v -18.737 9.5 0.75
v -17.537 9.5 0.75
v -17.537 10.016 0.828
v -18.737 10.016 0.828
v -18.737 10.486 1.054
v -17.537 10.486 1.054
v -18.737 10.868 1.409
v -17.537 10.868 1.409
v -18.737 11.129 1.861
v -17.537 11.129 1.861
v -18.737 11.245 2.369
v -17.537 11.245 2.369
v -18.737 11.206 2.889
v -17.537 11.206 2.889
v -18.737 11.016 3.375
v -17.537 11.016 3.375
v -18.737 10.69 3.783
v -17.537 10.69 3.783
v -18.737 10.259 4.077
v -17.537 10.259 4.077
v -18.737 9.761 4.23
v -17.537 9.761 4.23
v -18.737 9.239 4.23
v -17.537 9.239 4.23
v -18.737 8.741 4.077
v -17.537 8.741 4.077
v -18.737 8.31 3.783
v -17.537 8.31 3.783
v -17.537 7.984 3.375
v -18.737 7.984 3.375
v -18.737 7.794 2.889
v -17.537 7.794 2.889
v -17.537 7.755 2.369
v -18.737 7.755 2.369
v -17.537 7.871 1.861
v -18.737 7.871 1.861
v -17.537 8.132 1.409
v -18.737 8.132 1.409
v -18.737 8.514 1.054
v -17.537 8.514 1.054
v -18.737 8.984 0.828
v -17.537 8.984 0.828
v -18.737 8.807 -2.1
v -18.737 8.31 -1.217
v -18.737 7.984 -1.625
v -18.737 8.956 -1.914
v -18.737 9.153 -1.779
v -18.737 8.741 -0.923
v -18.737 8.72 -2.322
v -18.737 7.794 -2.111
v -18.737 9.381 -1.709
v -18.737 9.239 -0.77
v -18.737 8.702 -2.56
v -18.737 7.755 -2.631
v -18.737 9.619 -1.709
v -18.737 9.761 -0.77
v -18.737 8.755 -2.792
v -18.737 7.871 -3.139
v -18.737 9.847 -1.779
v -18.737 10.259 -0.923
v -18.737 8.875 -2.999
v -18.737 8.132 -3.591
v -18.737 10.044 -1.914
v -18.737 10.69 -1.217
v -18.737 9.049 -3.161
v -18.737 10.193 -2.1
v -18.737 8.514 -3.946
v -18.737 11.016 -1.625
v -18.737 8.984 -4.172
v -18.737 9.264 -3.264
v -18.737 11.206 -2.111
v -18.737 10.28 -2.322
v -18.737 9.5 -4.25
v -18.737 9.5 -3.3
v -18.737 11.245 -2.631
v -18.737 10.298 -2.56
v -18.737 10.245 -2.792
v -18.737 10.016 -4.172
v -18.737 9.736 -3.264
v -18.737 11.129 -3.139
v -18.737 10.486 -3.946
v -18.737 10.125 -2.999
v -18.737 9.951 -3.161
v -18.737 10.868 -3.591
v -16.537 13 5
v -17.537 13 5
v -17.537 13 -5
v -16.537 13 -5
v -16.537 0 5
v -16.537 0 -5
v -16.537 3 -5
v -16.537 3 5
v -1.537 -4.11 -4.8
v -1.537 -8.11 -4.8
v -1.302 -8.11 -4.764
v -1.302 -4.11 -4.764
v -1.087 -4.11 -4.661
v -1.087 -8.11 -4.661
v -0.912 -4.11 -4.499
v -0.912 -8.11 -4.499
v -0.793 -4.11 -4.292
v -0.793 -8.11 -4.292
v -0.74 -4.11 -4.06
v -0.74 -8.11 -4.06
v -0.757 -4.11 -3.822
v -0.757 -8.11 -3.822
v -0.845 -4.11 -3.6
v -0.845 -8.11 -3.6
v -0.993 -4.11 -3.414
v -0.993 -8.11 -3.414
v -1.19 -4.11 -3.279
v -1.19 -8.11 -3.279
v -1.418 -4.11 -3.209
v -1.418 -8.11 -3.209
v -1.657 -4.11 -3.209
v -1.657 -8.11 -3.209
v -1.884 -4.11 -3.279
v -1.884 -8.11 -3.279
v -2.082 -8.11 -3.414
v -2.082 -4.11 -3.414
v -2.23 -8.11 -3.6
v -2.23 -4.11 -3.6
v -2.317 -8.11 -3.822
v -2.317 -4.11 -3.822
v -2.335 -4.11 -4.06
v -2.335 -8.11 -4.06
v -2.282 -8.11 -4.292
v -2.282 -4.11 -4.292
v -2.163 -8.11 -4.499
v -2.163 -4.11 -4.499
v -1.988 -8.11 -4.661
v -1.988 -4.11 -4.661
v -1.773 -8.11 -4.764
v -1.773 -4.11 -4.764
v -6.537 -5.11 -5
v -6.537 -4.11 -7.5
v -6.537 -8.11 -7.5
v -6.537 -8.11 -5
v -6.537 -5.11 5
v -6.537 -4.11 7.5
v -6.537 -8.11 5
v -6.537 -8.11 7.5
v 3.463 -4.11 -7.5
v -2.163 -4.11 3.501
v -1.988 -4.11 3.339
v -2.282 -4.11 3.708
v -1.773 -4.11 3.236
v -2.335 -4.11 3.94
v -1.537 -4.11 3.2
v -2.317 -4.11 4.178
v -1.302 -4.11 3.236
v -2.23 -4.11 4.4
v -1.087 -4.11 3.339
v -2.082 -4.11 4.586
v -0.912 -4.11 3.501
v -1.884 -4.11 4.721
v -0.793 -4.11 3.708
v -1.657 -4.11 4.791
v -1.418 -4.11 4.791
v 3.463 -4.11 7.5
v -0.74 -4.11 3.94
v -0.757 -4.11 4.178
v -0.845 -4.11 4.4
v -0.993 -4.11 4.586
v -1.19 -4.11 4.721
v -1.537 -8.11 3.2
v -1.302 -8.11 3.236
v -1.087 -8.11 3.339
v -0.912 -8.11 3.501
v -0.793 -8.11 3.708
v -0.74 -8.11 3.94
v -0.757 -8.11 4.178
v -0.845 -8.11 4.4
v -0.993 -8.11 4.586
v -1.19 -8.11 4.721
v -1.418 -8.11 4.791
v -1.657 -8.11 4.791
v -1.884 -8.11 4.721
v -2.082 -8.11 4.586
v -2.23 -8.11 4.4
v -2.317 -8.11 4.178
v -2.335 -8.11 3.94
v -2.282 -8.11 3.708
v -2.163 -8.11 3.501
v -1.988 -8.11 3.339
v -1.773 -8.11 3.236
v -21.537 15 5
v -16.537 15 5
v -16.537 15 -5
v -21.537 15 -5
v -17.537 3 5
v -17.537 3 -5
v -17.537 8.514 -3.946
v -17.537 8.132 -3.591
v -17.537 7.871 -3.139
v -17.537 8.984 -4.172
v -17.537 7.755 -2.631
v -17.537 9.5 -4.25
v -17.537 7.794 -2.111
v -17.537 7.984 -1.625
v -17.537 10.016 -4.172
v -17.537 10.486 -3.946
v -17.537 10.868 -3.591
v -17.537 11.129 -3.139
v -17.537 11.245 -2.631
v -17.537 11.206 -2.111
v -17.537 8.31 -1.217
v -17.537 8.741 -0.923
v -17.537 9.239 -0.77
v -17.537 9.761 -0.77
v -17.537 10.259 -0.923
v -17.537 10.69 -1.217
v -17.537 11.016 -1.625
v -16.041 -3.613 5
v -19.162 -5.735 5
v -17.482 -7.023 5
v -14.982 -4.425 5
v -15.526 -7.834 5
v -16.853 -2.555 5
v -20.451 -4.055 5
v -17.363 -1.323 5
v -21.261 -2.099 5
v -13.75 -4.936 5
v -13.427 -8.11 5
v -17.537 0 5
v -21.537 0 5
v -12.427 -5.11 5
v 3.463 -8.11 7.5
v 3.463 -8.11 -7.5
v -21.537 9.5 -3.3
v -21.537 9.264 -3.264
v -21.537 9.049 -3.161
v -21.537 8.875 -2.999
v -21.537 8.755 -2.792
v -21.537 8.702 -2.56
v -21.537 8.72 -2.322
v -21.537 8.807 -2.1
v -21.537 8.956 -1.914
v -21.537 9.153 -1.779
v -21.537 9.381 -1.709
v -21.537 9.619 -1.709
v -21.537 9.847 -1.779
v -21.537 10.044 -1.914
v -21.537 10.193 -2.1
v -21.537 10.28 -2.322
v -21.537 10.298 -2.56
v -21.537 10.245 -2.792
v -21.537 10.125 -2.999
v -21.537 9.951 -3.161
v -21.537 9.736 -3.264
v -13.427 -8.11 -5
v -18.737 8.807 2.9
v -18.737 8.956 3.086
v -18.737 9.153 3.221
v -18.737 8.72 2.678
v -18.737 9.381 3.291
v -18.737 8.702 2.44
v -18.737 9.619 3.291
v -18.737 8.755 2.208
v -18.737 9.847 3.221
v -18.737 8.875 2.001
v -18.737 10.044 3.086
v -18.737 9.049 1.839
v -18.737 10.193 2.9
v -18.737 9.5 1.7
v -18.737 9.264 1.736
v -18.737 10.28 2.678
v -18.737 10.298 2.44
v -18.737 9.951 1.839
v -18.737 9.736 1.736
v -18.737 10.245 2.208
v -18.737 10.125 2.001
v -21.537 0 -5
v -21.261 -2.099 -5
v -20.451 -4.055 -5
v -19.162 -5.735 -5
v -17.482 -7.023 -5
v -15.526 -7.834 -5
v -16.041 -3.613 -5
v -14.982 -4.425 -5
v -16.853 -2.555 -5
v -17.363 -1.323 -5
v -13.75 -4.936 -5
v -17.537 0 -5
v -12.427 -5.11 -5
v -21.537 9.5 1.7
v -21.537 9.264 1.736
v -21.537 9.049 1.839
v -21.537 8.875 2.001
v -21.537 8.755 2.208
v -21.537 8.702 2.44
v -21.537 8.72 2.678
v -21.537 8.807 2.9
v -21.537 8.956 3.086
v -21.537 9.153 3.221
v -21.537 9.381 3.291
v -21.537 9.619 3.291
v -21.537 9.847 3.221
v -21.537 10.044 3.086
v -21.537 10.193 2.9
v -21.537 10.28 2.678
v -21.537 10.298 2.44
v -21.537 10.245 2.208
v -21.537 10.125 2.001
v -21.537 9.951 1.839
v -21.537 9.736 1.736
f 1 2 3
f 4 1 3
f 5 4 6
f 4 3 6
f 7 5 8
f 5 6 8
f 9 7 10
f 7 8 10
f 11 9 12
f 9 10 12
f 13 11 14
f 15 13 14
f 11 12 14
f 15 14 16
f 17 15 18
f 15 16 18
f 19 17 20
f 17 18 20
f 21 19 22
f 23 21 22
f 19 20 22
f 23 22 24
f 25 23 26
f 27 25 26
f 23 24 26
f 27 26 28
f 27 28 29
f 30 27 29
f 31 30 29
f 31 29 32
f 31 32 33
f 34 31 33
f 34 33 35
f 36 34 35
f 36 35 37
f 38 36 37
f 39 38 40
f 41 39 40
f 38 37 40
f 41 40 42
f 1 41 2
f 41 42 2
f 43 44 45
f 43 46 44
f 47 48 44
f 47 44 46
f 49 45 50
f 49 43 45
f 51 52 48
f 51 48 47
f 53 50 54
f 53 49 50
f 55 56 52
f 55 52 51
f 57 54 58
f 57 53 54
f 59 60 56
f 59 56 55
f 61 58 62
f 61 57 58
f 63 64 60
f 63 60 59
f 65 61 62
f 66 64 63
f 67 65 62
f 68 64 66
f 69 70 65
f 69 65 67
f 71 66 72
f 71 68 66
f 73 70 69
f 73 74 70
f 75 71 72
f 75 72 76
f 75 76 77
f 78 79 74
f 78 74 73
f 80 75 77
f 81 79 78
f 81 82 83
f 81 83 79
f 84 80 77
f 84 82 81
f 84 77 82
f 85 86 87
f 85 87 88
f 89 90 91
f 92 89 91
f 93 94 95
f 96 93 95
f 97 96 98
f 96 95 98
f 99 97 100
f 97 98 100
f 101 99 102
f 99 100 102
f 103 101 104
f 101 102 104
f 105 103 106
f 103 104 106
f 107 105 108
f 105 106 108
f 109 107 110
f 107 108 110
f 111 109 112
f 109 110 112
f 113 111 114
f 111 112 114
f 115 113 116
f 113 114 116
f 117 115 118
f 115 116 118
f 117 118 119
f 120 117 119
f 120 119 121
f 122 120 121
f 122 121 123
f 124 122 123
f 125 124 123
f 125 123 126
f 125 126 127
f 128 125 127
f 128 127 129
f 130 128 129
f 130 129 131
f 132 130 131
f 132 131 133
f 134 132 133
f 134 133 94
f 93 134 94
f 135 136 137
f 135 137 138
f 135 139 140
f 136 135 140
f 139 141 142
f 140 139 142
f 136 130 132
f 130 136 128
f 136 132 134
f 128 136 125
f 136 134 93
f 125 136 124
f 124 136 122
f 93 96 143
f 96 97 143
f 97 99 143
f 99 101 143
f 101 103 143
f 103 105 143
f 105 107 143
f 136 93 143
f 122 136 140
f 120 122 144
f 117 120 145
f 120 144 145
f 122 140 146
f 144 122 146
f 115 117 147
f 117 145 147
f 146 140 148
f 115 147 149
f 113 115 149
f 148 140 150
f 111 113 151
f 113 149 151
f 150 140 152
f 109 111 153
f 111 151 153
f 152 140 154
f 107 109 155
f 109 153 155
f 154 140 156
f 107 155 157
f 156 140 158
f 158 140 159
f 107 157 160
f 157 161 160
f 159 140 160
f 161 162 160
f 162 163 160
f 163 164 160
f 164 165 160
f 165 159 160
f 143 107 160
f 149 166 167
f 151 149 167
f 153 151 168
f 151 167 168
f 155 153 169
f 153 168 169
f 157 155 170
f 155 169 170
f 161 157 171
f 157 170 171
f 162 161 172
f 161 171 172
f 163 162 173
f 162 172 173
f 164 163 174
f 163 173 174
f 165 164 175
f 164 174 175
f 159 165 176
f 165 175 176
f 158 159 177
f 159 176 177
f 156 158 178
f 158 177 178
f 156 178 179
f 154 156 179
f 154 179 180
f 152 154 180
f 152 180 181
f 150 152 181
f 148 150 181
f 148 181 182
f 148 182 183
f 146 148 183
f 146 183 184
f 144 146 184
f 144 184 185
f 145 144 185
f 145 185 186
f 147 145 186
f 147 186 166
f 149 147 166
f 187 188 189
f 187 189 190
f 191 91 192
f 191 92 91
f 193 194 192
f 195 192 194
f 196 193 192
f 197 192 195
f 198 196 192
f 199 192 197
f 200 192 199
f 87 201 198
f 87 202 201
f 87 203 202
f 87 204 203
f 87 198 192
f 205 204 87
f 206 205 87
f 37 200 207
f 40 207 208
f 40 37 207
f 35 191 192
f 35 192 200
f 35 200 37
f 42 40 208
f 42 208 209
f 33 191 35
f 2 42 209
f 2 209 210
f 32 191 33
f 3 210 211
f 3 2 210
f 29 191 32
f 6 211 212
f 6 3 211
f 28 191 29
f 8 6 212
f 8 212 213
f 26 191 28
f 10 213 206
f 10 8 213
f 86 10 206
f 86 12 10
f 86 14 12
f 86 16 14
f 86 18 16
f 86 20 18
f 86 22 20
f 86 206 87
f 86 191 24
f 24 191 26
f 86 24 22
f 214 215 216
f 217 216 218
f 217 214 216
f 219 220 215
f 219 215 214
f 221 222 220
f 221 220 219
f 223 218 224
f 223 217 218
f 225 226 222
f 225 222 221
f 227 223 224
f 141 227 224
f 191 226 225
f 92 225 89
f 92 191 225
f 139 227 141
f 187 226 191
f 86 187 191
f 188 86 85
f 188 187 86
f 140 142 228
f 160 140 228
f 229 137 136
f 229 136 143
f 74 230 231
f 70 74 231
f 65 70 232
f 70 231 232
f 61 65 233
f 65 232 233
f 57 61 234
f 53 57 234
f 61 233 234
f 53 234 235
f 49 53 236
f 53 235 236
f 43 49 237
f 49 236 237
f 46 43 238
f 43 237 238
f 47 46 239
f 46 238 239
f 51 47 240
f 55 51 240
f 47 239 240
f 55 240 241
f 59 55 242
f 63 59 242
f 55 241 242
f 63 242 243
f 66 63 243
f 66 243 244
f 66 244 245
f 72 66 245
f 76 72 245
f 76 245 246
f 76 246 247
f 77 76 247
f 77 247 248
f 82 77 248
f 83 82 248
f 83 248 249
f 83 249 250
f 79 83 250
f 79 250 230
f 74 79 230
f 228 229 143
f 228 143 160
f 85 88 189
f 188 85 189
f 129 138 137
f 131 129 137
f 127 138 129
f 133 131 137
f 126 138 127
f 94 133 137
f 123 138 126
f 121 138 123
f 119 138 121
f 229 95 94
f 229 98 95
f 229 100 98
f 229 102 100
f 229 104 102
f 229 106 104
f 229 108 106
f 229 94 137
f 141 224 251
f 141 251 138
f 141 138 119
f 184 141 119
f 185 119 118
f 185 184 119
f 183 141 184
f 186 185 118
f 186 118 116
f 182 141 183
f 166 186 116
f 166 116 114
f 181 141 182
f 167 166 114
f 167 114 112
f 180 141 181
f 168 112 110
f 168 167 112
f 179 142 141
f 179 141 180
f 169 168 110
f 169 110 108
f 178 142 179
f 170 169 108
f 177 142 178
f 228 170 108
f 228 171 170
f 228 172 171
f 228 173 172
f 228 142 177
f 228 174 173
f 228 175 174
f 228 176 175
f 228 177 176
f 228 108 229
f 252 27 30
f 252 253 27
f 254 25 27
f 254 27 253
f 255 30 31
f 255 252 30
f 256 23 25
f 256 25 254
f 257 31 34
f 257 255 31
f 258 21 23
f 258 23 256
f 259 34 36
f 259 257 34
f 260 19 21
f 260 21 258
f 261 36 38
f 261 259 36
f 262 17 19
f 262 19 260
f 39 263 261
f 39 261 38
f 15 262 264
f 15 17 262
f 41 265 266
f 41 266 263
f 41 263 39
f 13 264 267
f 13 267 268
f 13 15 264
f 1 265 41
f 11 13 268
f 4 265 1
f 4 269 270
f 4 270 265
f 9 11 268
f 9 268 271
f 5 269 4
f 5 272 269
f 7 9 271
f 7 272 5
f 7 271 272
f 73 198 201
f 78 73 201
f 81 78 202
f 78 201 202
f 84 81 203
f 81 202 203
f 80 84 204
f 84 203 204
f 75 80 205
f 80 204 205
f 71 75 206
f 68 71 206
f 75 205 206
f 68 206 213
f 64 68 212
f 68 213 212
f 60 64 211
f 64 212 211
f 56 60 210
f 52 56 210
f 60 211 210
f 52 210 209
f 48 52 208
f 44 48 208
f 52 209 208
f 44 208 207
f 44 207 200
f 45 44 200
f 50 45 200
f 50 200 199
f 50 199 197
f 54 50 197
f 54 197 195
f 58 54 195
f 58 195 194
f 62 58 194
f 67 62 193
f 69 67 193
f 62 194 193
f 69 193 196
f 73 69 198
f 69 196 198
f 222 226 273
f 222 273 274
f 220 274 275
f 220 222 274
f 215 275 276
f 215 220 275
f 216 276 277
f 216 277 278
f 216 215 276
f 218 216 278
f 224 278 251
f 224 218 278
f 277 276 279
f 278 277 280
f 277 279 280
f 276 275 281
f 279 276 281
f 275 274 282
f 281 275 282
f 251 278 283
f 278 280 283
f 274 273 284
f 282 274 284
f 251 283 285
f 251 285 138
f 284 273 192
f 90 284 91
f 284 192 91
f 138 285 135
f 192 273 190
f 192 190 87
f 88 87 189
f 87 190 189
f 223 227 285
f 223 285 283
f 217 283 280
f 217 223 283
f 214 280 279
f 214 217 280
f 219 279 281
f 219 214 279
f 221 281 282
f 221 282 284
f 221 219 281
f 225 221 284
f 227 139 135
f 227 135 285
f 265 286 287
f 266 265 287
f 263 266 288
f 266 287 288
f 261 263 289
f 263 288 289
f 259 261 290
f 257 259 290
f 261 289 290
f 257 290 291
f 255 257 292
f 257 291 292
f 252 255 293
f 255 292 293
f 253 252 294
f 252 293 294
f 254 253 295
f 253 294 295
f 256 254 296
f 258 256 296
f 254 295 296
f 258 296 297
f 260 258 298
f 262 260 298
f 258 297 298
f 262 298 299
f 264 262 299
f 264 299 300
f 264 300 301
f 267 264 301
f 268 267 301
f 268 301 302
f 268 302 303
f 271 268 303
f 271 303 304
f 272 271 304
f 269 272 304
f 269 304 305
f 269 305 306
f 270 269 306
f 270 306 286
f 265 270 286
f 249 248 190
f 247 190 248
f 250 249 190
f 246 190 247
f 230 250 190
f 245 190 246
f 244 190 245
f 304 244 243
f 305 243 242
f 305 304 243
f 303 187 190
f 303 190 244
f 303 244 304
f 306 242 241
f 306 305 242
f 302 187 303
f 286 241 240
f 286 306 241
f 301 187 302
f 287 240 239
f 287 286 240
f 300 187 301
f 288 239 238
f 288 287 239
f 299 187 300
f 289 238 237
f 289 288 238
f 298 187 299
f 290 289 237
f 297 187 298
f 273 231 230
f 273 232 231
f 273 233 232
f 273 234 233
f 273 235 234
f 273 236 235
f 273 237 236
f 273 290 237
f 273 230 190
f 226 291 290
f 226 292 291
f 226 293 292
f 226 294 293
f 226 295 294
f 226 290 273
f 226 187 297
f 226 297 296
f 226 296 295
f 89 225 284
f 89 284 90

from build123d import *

# Parameters (mm, degrees)
BOSS_EXTRUDE1_DEPTH         = 5
TAP_DRILL_FOR_M2X0_4_TAP1_D = 1.6
SKETCH4_R                   = 1.75
CUT_EXTRUDE1_DEPTH          = 1.2
SKETCH5_W                   = 10
SKETCH5_H                   = 15
BOSS_EXTRUDE2_DEPTH         = 4
TAP_DRILL_FOR_M2X0_4_TAP2_D = 1.6


with BuildPart() as part:
    # Sketch1 → Boss-Extrude1 (new, symmetric)
    with BuildSketch(Plane.XY):
        with BuildLine():
            Line((-17.53737418, 3), (-17.53737418, 13))
            Line((-17.53737418, 13), (-16.53737418, 13))
            Line((-16.53737418, 13), (-16.53737418, 15))
            Line((-16.53737418, 15), (-21.53737418, 15))
            Line((-21.53737418, 15), (-21.53737418, 0))
            ThreePointArc((-21.53737418, 0), (-19.162010175, -5.734635995), (-13.42737418, -8.11))
            Line((-13.42737418, -8.11), (3.46262582, -8.11))
            Line((3.46262582, -8.11), (3.46262582, -5.11))
            Line((3.46262582, -5.11), (-12.42737418, -5.11))
            ThreePointArc((-12.42737418, -5.11), (-16.040689832, -3.613315652), (-17.53737418, 0))
            Line((-17.53737418, 0), (-16.53737418, 0))
            Line((-16.53737418, 0), (-16.53737418, 3))
            Line((-16.53737418, 3), (-17.53737418, 3))
        make_face()
    extrude(amount=BOSS_EXTRUDE1_DEPTH, both=True)

    # Tap Drill for M2x0.4 Tap1 (through all)
    with Locations(Plane(origin=(-17.53737418, 9.5, 2.5), x_dir=(0, 0, 1), z_dir=(1, 0, 0))):
        with Locations((0, 0), (-5, 0)):
            Hole(TAP_DRILL_FOR_M2X0_4_TAP1_D / 2)

    # Sketch4 → Cut-Extrude1 (cut)
    with BuildSketch(Plane(origin=(-17.53737418, 0, 0), x_dir=(0, 0, -1), z_dir=(1, 0, 0))):
        with Locations((-2.5, 9.5)):
            Circle(SKETCH4_R)
        with Locations((2.5, 9.5)):
            Circle(SKETCH4_R)
    extrude(amount=-CUT_EXTRUDE1_DEPTH, mode=Mode.SUBTRACT)

    # Sketch5 → Boss-Extrude2 (add)
    with BuildSketch(Plane.XZ.offset(8.11)):
        with Locations((-1.53737418, 0)):
            Rectangle(SKETCH5_W, SKETCH5_H)
    extrude(amount=-BOSS_EXTRUDE2_DEPTH)

    # Tap Drill for M2x0.4 Tap2 (through all)
    with Locations(Plane(origin=(-1.53737418, -4.11, 4), x_dir=(0, 0, 1), z_dir=(0, 1, 0))):
        with Locations((0, 0), (-8, 0)):
            Hole(TAP_DRILL_FOR_M2X0_4_TAP2_D / 2)


solid = part.part
